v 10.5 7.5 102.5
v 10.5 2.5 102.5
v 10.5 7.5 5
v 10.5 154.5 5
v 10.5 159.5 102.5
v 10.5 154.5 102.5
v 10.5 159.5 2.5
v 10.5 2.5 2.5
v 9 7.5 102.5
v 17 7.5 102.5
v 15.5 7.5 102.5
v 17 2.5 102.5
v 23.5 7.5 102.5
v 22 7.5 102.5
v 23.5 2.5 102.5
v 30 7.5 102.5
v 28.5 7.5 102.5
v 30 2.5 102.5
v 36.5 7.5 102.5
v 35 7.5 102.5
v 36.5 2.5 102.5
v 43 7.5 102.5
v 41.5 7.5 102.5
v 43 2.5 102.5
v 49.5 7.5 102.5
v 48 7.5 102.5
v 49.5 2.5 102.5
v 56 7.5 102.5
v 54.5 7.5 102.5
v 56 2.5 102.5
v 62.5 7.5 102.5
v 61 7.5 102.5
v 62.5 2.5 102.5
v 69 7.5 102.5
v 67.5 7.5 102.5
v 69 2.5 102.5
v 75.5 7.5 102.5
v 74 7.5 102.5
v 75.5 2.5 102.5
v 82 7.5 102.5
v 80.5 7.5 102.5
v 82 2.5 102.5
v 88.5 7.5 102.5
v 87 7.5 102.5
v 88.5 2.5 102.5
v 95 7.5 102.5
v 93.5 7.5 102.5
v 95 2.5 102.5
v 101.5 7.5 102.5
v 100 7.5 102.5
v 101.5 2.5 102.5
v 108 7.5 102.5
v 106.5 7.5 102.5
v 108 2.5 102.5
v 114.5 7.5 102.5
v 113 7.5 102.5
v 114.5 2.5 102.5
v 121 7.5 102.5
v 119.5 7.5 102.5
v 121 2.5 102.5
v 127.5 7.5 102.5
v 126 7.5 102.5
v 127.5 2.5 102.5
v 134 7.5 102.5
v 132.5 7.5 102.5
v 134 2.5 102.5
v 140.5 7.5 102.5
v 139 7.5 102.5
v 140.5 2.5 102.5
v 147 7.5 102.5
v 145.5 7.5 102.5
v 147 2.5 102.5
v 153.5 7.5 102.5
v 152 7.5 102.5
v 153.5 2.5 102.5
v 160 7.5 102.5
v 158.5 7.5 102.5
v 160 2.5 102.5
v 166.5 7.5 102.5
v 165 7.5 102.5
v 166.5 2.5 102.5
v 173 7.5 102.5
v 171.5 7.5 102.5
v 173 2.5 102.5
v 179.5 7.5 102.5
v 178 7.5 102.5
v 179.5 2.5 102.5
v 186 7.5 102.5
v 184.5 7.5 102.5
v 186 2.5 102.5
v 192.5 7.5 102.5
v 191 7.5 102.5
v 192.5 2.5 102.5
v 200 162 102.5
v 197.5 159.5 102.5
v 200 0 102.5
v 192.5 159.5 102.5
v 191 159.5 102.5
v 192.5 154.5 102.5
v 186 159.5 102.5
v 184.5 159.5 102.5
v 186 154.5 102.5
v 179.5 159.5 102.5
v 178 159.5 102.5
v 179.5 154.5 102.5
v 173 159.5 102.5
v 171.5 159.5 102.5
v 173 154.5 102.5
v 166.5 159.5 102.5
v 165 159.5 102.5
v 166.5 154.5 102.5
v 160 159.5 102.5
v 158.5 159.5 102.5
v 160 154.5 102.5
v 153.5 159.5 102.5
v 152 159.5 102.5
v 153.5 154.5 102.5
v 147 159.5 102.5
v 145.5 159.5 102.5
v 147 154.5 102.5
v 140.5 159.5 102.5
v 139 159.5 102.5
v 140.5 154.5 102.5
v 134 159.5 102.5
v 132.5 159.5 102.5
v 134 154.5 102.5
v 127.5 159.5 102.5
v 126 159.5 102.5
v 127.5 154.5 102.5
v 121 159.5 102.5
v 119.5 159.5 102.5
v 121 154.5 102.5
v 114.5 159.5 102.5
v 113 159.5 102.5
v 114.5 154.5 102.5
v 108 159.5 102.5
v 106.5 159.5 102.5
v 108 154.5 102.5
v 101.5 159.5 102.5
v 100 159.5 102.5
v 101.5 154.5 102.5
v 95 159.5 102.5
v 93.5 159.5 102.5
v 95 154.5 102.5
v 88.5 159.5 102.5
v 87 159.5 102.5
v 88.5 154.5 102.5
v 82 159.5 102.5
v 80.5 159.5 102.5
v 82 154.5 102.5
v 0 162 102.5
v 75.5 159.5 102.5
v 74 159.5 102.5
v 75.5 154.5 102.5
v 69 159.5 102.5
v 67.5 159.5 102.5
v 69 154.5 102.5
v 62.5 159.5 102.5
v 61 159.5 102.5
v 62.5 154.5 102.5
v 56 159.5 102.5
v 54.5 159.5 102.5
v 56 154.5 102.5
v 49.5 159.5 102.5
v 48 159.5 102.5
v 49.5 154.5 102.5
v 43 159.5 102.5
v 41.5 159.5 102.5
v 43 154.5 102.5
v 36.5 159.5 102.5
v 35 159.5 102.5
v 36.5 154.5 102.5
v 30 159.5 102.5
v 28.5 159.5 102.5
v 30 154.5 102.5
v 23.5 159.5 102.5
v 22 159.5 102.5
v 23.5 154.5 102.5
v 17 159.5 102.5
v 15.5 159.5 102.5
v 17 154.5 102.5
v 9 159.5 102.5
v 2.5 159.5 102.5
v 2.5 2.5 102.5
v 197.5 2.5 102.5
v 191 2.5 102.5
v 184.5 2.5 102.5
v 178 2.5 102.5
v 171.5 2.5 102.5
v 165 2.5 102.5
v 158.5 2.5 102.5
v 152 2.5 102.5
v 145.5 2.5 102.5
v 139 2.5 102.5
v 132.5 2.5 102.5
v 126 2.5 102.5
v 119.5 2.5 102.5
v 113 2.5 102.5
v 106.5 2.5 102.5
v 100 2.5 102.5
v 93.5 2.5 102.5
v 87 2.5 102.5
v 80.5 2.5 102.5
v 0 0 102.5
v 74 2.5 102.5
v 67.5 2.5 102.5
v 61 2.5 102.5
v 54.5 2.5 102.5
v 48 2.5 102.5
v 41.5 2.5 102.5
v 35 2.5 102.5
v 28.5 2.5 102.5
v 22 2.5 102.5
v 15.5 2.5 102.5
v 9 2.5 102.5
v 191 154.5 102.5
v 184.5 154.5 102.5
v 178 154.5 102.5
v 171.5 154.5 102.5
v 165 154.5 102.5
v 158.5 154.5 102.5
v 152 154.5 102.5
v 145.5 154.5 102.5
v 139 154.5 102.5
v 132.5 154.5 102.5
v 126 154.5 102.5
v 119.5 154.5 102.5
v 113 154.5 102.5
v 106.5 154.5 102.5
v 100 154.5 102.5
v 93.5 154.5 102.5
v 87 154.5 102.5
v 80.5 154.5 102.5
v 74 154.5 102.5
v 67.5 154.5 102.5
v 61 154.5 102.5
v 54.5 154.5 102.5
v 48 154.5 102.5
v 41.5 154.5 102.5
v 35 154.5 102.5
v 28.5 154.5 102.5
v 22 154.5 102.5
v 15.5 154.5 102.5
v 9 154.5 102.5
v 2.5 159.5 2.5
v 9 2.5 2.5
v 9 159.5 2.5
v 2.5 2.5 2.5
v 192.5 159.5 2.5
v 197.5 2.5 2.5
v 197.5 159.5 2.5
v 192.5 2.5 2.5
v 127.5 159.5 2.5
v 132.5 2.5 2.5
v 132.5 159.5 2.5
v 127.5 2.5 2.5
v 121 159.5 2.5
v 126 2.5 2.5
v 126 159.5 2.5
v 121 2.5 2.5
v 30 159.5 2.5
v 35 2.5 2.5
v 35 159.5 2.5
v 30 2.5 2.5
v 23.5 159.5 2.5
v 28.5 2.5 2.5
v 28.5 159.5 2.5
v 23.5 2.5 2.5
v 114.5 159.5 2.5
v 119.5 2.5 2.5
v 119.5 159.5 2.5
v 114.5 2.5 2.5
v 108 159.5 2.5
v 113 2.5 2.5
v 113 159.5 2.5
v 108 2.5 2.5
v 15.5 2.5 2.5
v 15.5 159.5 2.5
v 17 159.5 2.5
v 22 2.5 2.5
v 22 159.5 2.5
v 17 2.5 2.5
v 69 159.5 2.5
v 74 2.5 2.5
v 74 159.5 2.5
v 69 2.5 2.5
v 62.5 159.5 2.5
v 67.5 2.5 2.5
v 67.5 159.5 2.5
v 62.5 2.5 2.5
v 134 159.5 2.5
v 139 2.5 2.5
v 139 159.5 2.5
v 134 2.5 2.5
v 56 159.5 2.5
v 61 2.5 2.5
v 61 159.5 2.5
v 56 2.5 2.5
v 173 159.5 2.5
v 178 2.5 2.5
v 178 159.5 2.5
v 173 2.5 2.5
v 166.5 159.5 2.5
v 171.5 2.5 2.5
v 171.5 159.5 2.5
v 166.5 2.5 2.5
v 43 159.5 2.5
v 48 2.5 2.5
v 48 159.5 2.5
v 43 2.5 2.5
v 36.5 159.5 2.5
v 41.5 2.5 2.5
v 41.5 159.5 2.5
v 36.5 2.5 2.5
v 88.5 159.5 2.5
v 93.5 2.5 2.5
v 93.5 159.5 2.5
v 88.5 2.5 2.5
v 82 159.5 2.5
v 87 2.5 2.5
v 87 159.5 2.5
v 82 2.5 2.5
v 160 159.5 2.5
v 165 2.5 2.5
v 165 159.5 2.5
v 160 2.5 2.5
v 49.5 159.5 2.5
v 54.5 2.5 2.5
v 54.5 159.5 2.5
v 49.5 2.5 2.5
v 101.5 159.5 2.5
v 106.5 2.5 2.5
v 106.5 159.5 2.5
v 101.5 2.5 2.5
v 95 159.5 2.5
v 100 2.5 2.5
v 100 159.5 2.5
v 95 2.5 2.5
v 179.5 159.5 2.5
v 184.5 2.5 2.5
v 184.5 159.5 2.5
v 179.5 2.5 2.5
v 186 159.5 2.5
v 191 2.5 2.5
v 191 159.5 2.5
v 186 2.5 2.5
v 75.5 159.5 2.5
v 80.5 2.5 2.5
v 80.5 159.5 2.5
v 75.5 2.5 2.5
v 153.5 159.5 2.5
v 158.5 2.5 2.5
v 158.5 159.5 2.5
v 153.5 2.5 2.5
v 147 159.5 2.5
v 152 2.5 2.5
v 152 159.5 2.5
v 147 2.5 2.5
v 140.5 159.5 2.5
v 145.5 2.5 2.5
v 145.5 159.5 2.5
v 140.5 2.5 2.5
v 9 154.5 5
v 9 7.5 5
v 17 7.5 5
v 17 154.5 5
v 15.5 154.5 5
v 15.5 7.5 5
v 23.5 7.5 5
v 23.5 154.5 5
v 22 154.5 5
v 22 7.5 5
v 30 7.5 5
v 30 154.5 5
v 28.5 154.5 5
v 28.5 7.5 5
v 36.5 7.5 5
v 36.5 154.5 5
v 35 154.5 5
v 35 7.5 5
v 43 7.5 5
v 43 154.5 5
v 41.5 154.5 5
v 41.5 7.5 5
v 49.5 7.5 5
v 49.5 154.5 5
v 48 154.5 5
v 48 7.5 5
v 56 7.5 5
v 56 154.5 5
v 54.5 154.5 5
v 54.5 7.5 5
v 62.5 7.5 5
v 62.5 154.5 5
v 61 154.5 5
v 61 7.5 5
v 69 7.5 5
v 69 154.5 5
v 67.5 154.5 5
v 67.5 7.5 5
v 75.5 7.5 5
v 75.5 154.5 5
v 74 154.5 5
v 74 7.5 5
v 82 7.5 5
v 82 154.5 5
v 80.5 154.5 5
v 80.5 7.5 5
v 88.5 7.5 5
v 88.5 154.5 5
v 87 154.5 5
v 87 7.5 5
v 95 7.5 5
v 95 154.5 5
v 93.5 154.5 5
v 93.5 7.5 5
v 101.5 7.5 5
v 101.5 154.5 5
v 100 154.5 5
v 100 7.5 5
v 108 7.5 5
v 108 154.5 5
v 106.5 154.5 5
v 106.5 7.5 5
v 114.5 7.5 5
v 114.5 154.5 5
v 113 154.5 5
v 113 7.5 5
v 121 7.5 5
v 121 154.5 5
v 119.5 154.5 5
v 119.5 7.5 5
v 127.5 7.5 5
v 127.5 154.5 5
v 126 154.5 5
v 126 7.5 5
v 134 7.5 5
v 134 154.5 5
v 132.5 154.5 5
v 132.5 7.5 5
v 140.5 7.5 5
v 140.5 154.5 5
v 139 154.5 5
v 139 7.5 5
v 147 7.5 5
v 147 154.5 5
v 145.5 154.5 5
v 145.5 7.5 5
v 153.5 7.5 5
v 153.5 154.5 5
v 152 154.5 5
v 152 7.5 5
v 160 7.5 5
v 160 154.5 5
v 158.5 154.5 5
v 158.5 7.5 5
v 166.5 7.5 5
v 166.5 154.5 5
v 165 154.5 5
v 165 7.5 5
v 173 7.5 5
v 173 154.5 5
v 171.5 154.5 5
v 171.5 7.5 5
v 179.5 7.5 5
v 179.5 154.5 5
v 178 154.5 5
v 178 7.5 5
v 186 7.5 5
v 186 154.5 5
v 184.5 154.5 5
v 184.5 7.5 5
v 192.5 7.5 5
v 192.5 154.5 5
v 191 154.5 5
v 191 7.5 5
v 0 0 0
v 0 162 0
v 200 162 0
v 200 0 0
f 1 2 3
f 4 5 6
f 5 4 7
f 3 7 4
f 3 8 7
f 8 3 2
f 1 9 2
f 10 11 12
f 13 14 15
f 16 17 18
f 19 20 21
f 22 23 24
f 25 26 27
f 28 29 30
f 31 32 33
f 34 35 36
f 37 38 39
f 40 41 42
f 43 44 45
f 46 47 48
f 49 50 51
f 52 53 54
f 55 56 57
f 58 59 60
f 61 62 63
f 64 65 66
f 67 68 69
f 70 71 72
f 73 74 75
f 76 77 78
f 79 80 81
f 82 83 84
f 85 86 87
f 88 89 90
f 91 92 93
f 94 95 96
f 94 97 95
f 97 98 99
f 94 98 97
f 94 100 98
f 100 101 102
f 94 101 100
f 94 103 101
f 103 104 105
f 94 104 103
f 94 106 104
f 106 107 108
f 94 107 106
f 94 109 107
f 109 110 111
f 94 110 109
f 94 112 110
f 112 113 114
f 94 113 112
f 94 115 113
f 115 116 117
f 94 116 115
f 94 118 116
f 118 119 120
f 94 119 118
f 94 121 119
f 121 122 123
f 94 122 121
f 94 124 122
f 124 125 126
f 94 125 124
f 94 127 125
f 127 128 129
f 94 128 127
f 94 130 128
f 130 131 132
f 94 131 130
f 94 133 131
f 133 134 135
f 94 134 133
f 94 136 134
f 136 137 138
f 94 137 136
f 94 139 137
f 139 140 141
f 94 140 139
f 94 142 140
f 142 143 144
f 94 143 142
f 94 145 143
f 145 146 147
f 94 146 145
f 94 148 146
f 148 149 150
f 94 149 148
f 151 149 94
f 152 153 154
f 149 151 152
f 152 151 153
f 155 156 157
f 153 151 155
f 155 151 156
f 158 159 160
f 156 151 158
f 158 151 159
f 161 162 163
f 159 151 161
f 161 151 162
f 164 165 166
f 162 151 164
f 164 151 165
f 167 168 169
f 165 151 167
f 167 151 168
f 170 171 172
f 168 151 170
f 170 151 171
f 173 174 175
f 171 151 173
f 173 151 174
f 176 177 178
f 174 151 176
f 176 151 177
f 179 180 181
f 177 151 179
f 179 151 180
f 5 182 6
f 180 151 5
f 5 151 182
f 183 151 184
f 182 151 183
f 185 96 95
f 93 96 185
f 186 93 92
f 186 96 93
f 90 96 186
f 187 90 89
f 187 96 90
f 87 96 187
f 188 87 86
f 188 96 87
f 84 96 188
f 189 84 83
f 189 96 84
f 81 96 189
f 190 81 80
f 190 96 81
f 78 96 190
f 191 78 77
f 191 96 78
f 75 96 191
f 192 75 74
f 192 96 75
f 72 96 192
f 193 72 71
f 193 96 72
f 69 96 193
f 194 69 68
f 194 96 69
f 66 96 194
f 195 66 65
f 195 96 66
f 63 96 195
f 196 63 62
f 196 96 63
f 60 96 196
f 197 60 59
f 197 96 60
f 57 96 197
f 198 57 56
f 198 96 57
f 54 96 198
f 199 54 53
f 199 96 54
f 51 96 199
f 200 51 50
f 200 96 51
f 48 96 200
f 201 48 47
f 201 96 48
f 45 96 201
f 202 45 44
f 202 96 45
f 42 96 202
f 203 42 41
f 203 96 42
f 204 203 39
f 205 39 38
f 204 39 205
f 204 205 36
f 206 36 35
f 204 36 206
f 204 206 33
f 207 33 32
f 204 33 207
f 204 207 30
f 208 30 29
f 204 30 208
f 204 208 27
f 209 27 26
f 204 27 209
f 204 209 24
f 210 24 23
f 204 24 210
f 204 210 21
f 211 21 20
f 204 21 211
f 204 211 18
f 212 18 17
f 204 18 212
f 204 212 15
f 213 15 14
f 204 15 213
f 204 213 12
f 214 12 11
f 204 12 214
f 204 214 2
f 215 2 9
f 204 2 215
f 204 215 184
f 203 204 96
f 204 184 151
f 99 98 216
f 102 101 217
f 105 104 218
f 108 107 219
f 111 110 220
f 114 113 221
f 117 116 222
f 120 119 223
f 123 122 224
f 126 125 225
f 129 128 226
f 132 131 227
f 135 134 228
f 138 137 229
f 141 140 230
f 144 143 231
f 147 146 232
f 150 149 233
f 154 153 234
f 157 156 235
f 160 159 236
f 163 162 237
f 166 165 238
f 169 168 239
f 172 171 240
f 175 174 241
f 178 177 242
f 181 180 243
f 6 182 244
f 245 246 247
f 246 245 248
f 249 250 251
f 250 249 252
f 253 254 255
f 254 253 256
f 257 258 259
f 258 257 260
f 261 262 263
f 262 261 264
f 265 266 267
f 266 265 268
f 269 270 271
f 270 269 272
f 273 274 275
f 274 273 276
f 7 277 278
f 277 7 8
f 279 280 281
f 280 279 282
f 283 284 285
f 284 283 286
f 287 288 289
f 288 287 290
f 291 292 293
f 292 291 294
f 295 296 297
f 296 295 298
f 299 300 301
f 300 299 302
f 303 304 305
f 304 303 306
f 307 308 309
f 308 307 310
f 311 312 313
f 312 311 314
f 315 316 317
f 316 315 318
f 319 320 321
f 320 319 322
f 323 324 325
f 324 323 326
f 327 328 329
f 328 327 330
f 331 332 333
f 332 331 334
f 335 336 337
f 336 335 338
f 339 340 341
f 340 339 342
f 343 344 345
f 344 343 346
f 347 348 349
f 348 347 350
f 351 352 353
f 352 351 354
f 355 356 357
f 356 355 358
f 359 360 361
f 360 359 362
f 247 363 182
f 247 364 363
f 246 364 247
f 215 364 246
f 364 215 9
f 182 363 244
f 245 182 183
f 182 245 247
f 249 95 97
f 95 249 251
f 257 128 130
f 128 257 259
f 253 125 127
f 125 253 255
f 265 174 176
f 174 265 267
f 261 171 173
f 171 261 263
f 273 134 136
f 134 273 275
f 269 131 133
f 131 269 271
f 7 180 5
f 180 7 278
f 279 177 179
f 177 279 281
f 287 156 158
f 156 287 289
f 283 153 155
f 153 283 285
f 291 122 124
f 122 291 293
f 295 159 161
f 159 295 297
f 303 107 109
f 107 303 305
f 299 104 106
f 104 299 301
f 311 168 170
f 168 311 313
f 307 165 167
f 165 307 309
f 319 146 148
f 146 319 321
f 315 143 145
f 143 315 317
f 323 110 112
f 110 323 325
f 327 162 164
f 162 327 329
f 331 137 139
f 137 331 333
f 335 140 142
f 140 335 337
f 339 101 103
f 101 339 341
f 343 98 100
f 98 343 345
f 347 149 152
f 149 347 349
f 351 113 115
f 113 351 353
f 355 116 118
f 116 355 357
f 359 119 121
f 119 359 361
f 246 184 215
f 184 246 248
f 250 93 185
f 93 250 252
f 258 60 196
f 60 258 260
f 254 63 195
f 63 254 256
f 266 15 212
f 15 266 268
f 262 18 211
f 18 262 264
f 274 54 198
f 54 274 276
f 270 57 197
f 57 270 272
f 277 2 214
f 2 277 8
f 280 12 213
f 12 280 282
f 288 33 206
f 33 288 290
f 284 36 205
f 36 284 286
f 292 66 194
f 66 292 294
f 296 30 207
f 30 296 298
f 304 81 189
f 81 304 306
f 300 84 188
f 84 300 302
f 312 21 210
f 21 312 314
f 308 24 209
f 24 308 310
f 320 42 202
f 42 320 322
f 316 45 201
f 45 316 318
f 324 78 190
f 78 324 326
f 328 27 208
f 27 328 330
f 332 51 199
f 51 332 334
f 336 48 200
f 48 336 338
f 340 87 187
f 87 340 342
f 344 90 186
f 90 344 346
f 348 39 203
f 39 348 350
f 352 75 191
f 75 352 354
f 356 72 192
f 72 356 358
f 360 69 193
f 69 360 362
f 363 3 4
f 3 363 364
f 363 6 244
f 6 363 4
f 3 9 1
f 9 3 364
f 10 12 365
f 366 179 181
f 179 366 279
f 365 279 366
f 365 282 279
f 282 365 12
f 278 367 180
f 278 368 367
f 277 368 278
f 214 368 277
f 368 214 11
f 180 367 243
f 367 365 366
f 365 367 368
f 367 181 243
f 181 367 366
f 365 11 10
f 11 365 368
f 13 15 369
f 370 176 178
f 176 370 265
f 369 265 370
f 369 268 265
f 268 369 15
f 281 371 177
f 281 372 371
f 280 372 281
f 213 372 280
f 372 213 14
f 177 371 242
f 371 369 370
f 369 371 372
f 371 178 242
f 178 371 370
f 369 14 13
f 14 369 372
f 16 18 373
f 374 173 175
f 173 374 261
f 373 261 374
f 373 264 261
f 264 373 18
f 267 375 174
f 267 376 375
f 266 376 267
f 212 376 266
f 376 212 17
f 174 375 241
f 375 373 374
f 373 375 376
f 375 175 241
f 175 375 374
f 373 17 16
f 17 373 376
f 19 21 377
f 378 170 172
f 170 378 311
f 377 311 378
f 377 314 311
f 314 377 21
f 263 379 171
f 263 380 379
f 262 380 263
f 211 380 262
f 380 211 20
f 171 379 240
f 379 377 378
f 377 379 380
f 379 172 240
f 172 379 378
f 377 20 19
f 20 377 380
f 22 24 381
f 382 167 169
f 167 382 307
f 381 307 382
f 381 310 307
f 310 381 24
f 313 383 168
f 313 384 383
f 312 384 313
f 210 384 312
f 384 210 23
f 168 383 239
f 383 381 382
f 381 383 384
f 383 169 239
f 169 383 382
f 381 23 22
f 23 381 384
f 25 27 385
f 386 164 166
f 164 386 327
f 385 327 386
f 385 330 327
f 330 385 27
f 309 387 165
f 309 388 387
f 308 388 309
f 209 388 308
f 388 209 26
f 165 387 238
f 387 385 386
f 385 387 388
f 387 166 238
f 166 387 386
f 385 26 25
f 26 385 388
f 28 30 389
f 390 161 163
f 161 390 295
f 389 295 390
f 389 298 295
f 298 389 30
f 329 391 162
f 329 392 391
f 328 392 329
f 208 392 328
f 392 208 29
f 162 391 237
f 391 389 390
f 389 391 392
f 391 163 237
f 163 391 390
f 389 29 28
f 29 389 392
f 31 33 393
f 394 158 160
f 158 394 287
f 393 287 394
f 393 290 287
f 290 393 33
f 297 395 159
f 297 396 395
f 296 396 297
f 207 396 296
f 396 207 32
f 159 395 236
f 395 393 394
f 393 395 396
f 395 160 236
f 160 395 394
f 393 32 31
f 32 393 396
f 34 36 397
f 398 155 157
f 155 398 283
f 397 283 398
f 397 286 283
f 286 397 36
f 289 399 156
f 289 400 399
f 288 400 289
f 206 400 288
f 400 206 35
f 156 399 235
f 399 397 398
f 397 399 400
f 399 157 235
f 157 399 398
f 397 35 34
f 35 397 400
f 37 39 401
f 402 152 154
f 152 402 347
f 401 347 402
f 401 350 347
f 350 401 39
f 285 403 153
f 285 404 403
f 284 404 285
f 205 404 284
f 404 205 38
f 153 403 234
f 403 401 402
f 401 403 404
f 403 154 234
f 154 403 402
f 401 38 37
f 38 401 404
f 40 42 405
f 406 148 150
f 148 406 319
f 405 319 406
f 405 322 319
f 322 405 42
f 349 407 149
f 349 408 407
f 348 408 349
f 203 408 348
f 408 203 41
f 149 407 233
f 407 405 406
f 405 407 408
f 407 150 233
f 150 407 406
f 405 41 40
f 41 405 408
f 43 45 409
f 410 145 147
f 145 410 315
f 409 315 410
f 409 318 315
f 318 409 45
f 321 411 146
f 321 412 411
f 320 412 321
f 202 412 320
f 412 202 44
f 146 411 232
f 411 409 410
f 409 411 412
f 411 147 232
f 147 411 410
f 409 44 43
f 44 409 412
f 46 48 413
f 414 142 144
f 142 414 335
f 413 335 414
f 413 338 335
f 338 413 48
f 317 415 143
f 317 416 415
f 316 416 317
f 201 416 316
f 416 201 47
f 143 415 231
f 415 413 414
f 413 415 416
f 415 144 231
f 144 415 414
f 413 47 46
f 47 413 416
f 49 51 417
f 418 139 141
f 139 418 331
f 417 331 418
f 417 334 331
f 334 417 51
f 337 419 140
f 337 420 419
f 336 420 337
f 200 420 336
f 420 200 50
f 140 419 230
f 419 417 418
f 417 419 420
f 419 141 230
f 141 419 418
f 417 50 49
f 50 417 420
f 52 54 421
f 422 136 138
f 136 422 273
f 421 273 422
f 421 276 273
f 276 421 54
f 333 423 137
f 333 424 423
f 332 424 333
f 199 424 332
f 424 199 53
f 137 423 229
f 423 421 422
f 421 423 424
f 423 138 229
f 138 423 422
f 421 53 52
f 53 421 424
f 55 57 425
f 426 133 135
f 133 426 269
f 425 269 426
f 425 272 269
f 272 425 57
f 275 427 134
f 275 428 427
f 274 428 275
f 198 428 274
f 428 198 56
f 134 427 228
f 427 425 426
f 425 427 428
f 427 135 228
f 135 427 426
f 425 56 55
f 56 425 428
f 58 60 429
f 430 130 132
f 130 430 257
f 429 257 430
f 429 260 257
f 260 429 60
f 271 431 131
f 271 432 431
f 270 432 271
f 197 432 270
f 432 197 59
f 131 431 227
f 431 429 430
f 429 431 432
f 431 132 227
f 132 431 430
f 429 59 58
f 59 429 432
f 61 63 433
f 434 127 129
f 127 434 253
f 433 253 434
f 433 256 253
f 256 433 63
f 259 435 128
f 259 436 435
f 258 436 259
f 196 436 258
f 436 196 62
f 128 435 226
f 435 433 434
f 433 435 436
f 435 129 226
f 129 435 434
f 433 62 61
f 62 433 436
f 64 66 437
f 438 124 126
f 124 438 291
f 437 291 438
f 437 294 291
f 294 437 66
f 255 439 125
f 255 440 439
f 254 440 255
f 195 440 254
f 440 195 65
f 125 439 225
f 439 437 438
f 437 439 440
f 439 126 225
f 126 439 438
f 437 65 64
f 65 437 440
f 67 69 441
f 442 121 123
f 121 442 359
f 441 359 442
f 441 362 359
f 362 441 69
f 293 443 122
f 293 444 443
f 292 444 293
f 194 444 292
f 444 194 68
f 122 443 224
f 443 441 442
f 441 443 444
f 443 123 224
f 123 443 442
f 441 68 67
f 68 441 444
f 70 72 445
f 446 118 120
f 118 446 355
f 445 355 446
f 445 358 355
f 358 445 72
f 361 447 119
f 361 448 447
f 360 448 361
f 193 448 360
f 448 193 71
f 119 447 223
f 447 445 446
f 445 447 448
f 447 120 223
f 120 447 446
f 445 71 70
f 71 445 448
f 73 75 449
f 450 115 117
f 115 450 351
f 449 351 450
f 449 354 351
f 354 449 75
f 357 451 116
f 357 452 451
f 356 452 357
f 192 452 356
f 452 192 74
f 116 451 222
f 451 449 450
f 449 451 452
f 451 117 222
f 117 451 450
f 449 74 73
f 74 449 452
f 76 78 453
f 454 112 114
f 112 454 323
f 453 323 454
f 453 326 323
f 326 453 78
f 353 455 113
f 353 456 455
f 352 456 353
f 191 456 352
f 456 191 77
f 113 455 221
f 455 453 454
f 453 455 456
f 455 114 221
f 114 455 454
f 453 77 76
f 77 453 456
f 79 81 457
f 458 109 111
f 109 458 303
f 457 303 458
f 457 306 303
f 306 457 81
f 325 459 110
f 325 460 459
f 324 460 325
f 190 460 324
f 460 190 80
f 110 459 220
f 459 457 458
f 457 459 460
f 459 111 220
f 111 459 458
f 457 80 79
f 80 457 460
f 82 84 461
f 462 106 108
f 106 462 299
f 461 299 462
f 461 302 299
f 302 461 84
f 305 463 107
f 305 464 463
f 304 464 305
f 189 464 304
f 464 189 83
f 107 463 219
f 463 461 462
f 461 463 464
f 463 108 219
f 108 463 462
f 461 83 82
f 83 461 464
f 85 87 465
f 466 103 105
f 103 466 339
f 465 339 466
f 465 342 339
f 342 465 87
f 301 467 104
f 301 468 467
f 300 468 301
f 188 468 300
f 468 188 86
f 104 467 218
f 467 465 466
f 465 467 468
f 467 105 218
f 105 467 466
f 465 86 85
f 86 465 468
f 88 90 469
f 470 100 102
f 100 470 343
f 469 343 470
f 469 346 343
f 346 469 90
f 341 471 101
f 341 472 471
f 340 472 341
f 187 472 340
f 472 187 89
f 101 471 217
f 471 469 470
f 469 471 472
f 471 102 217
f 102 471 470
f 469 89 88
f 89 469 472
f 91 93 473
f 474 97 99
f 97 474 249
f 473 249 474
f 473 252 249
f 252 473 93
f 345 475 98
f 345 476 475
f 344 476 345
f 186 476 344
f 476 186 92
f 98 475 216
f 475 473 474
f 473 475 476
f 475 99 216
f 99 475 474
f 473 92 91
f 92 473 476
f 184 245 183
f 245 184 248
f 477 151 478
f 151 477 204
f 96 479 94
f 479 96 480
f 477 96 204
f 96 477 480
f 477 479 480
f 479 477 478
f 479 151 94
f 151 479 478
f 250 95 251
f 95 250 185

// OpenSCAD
/**
 * Attempt to create a holder for the graters for a Food Processor Attachment KAH65.000PL.
 *
 * Uses too much material, but it is a start.
 **/

side_height=100;
wall_thickness=2.5;
grater_width=157;
bottom_length=200;

shelf_width=5;
shelf_thickness=1.5;

shelf_interval=shelf_width + shelf_thickness;

module end()
{
    cube([wall_thickness, grater_width, side_height]);
}

module shelf()
{
    color("#fefefe")
    difference() {
        cube([shelf_thickness, grater_width, side_height]);
        translate([-1, shelf_width, wall_thickness]) cube([shelf_width, grater_width - shelf_width * 2, side_height]);
    };
}

module side()
{
    cube([bottom_length, wall_thickness, side_height]);
}

union()
{
  translate([0, wall_thickness, wall_thickness]) end();
  translate([0, 0, wall_thickness]) side();
  cube([bottom_length, grater_width + 2*wall_thickness, wall_thickness]);
  translate([bottom_length - wall_thickness, wall_thickness, wall_thickness]) end();
  translate([0, grater_width + wall_thickness, wall_thickness]) side();
    
   for (offset = [shelf_interval + wall_thickness: shelf_interval: bottom_length - shelf_interval])
   {
        translate([offset, wall_thickness, wall_thickness]) shelf();
   }
}
